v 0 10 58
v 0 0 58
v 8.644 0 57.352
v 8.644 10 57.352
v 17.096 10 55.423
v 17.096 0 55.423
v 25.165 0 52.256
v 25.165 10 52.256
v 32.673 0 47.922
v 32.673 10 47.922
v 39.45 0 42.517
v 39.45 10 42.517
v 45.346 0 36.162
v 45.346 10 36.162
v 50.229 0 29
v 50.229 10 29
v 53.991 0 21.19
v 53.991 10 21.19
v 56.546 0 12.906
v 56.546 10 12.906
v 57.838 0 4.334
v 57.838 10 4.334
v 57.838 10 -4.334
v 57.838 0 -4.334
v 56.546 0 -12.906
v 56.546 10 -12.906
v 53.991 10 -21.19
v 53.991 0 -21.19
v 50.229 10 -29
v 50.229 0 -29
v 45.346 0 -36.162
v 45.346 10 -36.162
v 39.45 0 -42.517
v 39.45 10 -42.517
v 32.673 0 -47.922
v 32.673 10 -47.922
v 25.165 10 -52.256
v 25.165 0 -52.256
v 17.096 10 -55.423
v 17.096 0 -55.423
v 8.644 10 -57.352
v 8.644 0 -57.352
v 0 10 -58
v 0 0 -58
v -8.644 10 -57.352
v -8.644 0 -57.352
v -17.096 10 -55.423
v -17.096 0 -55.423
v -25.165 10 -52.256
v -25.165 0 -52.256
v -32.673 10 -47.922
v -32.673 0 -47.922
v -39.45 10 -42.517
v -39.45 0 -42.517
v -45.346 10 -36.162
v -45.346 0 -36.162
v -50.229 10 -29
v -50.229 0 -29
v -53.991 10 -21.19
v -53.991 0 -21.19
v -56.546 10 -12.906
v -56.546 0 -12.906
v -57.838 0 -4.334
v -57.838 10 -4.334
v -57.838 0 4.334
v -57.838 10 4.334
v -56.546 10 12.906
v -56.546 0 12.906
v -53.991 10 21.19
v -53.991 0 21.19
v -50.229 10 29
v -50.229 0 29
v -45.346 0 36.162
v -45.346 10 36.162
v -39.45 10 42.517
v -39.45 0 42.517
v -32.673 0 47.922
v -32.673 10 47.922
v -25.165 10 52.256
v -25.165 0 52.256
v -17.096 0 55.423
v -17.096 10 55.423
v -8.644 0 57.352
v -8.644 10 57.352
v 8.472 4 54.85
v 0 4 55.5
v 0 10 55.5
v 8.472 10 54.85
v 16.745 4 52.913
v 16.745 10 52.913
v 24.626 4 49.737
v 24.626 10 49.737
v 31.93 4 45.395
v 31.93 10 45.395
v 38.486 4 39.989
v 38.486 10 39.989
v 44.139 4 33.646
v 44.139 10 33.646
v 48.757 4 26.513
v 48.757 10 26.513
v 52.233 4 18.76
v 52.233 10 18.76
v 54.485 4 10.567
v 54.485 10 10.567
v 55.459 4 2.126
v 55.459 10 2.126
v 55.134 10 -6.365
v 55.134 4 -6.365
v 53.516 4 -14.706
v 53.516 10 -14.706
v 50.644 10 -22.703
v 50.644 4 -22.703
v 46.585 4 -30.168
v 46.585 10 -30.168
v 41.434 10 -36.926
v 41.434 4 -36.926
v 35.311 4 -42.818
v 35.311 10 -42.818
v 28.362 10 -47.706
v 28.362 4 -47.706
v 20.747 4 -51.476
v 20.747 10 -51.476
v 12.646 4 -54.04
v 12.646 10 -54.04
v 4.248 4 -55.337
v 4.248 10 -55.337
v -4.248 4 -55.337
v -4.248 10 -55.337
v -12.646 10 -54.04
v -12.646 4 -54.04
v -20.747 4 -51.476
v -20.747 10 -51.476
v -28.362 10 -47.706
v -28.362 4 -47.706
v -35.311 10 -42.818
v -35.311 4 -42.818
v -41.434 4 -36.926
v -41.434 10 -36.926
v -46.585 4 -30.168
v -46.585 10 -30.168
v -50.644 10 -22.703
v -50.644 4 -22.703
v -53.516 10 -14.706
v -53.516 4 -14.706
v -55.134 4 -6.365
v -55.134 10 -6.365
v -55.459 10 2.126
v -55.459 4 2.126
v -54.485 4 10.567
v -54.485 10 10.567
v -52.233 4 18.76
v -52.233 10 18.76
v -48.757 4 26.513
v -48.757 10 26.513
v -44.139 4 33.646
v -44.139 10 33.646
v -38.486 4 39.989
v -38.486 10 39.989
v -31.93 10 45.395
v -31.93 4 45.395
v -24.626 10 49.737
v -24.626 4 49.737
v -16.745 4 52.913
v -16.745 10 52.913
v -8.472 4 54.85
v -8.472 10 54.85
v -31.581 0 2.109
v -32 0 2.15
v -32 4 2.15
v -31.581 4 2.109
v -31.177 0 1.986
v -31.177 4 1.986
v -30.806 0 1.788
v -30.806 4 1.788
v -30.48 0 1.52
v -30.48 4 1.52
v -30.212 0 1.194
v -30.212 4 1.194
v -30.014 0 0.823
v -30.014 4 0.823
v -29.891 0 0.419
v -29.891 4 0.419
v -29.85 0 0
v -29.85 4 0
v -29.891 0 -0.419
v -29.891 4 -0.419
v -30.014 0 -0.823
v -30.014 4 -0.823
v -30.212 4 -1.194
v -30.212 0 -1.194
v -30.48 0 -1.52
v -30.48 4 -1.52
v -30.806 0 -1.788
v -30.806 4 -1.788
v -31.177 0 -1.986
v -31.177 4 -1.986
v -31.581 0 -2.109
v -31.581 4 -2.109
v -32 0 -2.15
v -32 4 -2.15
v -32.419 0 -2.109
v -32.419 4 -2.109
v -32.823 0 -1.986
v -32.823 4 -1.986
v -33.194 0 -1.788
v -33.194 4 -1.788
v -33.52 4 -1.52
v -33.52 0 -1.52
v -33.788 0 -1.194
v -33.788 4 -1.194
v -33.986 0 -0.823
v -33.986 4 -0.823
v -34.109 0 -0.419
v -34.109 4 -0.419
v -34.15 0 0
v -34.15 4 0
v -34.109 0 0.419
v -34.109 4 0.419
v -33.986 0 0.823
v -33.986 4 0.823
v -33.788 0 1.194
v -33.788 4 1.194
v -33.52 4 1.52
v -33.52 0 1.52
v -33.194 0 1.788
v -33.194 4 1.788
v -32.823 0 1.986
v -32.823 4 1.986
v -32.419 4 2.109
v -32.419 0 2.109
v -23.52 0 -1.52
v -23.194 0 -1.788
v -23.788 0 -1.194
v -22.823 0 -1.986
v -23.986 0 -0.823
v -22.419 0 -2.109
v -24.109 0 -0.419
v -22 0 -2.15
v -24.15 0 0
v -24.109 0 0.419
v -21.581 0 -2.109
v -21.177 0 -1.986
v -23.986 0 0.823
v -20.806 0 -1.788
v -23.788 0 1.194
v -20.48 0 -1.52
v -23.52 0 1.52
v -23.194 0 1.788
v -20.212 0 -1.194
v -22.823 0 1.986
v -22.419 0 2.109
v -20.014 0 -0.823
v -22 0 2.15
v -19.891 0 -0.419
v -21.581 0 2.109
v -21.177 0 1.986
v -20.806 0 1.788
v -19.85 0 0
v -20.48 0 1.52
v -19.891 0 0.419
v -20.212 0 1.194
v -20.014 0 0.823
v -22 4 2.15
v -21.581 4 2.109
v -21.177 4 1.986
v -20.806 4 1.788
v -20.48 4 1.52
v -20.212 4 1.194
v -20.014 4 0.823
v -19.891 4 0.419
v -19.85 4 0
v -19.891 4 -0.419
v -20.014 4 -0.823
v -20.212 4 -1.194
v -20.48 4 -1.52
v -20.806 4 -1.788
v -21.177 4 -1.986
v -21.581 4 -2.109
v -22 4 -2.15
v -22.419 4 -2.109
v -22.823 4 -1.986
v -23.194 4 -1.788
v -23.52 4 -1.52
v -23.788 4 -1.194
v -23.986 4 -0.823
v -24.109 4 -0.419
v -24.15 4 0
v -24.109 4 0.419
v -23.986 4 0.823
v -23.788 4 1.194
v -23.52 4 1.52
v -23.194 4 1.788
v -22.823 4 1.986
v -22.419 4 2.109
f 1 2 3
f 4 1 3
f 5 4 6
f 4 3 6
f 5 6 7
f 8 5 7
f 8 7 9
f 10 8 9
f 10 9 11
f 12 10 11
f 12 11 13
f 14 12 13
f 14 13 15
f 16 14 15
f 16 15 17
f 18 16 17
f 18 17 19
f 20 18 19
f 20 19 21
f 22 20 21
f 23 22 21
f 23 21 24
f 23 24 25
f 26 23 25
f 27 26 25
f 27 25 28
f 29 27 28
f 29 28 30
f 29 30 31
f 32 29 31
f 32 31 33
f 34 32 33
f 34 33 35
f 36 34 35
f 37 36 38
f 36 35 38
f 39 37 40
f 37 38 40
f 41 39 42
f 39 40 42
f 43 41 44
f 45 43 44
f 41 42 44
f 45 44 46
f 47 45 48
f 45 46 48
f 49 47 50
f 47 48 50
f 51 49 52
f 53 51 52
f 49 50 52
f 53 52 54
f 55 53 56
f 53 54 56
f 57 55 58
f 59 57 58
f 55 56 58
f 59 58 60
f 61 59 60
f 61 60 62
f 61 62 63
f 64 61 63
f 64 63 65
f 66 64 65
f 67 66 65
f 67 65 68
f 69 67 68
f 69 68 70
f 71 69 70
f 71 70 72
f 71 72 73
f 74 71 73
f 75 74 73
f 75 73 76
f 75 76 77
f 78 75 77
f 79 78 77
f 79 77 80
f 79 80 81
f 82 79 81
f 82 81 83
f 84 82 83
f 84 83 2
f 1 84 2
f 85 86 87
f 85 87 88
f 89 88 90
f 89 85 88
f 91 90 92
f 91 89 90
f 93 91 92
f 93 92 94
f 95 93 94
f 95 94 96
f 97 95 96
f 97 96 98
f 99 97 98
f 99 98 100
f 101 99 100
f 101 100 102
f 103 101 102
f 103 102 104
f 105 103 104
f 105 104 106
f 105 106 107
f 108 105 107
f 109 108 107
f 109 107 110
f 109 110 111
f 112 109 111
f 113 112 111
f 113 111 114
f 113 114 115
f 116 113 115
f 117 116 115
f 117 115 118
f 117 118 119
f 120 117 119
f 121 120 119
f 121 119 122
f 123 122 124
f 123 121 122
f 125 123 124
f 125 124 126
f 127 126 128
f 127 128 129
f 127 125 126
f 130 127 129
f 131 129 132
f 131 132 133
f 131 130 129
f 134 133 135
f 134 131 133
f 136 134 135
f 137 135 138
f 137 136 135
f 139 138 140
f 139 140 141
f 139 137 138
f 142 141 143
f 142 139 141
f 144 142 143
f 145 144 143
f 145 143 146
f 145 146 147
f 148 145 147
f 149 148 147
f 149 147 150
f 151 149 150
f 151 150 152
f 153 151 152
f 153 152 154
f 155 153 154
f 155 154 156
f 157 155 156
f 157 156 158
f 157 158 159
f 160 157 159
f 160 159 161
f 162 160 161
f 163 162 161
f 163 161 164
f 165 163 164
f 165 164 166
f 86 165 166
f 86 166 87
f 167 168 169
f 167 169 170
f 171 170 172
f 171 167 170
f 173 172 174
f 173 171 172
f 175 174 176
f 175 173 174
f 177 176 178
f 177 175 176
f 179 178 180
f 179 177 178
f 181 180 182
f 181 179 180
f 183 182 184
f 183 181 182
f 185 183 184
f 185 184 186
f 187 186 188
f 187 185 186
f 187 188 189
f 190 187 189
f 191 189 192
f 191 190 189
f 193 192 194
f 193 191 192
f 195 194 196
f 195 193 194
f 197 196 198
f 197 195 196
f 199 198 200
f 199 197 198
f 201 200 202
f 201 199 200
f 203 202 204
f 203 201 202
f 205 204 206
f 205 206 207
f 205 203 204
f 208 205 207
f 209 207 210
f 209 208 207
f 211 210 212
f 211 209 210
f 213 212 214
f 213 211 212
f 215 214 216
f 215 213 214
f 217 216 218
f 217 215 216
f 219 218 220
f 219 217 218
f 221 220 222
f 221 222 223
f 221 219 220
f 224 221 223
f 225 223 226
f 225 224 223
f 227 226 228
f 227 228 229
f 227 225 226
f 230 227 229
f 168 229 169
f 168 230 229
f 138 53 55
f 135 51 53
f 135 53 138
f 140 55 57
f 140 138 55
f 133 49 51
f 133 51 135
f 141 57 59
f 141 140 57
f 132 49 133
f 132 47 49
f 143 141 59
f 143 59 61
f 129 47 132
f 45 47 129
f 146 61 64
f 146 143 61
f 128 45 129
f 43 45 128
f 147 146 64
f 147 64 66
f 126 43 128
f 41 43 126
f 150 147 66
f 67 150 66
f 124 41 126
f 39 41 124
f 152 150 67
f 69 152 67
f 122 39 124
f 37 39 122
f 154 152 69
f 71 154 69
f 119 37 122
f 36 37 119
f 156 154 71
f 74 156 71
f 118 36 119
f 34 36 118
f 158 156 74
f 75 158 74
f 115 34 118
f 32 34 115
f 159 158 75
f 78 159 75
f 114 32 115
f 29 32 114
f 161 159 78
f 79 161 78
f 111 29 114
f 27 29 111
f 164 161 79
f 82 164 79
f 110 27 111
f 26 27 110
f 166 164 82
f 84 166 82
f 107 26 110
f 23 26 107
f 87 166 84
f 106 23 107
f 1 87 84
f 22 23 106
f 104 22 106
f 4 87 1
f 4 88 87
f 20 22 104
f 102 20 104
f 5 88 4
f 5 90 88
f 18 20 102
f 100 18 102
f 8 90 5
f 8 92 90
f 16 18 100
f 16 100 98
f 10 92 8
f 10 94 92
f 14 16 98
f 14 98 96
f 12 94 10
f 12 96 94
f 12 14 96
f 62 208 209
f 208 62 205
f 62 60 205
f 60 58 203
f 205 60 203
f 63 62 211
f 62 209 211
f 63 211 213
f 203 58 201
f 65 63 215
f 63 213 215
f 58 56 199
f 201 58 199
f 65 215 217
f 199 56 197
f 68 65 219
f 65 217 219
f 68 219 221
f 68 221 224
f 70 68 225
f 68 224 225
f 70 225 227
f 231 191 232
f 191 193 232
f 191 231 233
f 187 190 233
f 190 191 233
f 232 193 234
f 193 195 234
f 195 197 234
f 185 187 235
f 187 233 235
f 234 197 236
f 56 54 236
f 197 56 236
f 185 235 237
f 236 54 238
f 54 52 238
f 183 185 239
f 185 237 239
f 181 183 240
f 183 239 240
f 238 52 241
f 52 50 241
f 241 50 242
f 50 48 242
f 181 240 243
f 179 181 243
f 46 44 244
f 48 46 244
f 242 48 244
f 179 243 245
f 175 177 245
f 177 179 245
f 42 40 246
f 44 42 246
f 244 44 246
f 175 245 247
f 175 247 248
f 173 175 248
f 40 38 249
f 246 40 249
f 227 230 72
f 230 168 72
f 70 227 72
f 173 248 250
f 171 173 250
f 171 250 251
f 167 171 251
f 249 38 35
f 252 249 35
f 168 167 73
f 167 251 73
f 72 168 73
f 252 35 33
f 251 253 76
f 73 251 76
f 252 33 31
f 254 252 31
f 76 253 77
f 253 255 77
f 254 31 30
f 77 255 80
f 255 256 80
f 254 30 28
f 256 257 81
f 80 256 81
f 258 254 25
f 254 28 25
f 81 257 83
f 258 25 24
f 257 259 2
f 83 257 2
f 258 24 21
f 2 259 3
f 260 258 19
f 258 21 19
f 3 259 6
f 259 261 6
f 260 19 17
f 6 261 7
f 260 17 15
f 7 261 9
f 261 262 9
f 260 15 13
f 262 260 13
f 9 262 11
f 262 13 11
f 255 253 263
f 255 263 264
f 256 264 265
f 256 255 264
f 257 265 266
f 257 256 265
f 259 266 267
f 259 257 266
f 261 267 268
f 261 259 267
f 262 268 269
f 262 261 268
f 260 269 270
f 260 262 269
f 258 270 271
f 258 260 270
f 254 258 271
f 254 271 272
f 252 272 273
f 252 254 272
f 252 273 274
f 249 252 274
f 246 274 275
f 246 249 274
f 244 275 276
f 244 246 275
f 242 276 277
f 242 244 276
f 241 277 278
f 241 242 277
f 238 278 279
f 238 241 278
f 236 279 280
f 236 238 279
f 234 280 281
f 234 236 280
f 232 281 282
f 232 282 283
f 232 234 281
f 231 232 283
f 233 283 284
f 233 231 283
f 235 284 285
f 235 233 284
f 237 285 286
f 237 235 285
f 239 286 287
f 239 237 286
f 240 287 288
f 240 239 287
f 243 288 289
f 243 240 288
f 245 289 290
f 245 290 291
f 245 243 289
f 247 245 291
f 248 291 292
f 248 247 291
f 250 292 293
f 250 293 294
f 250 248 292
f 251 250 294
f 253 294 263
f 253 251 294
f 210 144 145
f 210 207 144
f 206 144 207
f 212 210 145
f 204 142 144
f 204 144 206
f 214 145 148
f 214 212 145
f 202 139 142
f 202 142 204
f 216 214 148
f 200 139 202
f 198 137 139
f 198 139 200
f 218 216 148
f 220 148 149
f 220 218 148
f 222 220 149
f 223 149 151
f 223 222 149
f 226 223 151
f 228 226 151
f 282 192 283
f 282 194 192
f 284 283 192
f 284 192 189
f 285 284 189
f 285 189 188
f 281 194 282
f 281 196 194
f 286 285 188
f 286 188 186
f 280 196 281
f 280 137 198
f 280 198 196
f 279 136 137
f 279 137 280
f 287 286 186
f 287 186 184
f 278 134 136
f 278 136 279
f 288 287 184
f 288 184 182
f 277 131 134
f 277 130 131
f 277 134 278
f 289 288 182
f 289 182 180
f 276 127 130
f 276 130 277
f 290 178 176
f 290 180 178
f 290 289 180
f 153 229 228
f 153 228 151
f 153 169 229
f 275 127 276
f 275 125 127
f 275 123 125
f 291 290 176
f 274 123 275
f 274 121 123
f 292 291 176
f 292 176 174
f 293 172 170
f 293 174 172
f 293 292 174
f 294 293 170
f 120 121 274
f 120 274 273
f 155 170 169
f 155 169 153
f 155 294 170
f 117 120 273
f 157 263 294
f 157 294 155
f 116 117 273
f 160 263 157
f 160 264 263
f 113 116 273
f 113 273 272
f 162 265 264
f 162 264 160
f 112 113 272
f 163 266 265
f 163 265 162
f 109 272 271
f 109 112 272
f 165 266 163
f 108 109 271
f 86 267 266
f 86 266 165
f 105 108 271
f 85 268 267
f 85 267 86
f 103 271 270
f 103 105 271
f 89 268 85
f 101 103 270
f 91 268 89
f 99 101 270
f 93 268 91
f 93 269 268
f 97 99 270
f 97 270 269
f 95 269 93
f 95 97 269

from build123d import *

# Parameters (mm, degrees)
SKETCH_1_R                       = 58
CUP_PLATE_D116_T4_DEPTH          = 4
SKETCH_2_R                       = 58
SKETCH_2_R_2                     = 55.5
DRIP_SKIRT_OD116_ID111_H10_DEPTH = 10
SKETCH_3_R                       = 2.15
M4_MOVING_MOUNT_CLEARANCE_DEPTH  = 4


with BuildPart() as part:
    # 草图1 → Cup_plate_D116_T4 (new body)
    with BuildSketch(Plane(origin=(0, 0, 0), x_dir=(1, 0, 0), z_dir=(0, 1, 0))):
        with Locations(Location((0, 0, 0), (0, 0, 270))):
            Circle(SKETCH_1_R)
    extrude(amount=CUP_PLATE_D116_T4_DEPTH)

    # 草图2 → Drip_skirt_OD116_ID111_H10 (add)
    with BuildSketch(Plane(origin=(0, 0, 0), x_dir=(1, 0, 0), z_dir=(0, 1, 0))):
        with Locations(Location((0, 0, 0), (0, 0, 270))):
            Circle(SKETCH_2_R)
        with Locations(Location((0, 0, 0), (0, 0, 270))):
            Circle(SKETCH_2_R_2, mode=Mode.SUBTRACT)
    extrude(amount=DRIP_SKIRT_OD116_ID111_H10_DEPTH)

    # 草图3 → M4_moving_mount_clearance (cut)
    with BuildSketch(Plane(origin=(0, 0, 0), x_dir=(1, 0, 0), z_dir=(0, 1, 0))):
        with Locations(Location((-22, 0, 0), (0, 0, 270))):
            Circle(SKETCH_3_R)
        with Locations(Location((-32, 0, 0), (0, 0, 270))):
            Circle(SKETCH_3_R)
    extrude(amount=M4_MOVING_MOUNT_CLEARANCE_DEPTH, mode=Mode.SUBTRACT)


solid = part.part
